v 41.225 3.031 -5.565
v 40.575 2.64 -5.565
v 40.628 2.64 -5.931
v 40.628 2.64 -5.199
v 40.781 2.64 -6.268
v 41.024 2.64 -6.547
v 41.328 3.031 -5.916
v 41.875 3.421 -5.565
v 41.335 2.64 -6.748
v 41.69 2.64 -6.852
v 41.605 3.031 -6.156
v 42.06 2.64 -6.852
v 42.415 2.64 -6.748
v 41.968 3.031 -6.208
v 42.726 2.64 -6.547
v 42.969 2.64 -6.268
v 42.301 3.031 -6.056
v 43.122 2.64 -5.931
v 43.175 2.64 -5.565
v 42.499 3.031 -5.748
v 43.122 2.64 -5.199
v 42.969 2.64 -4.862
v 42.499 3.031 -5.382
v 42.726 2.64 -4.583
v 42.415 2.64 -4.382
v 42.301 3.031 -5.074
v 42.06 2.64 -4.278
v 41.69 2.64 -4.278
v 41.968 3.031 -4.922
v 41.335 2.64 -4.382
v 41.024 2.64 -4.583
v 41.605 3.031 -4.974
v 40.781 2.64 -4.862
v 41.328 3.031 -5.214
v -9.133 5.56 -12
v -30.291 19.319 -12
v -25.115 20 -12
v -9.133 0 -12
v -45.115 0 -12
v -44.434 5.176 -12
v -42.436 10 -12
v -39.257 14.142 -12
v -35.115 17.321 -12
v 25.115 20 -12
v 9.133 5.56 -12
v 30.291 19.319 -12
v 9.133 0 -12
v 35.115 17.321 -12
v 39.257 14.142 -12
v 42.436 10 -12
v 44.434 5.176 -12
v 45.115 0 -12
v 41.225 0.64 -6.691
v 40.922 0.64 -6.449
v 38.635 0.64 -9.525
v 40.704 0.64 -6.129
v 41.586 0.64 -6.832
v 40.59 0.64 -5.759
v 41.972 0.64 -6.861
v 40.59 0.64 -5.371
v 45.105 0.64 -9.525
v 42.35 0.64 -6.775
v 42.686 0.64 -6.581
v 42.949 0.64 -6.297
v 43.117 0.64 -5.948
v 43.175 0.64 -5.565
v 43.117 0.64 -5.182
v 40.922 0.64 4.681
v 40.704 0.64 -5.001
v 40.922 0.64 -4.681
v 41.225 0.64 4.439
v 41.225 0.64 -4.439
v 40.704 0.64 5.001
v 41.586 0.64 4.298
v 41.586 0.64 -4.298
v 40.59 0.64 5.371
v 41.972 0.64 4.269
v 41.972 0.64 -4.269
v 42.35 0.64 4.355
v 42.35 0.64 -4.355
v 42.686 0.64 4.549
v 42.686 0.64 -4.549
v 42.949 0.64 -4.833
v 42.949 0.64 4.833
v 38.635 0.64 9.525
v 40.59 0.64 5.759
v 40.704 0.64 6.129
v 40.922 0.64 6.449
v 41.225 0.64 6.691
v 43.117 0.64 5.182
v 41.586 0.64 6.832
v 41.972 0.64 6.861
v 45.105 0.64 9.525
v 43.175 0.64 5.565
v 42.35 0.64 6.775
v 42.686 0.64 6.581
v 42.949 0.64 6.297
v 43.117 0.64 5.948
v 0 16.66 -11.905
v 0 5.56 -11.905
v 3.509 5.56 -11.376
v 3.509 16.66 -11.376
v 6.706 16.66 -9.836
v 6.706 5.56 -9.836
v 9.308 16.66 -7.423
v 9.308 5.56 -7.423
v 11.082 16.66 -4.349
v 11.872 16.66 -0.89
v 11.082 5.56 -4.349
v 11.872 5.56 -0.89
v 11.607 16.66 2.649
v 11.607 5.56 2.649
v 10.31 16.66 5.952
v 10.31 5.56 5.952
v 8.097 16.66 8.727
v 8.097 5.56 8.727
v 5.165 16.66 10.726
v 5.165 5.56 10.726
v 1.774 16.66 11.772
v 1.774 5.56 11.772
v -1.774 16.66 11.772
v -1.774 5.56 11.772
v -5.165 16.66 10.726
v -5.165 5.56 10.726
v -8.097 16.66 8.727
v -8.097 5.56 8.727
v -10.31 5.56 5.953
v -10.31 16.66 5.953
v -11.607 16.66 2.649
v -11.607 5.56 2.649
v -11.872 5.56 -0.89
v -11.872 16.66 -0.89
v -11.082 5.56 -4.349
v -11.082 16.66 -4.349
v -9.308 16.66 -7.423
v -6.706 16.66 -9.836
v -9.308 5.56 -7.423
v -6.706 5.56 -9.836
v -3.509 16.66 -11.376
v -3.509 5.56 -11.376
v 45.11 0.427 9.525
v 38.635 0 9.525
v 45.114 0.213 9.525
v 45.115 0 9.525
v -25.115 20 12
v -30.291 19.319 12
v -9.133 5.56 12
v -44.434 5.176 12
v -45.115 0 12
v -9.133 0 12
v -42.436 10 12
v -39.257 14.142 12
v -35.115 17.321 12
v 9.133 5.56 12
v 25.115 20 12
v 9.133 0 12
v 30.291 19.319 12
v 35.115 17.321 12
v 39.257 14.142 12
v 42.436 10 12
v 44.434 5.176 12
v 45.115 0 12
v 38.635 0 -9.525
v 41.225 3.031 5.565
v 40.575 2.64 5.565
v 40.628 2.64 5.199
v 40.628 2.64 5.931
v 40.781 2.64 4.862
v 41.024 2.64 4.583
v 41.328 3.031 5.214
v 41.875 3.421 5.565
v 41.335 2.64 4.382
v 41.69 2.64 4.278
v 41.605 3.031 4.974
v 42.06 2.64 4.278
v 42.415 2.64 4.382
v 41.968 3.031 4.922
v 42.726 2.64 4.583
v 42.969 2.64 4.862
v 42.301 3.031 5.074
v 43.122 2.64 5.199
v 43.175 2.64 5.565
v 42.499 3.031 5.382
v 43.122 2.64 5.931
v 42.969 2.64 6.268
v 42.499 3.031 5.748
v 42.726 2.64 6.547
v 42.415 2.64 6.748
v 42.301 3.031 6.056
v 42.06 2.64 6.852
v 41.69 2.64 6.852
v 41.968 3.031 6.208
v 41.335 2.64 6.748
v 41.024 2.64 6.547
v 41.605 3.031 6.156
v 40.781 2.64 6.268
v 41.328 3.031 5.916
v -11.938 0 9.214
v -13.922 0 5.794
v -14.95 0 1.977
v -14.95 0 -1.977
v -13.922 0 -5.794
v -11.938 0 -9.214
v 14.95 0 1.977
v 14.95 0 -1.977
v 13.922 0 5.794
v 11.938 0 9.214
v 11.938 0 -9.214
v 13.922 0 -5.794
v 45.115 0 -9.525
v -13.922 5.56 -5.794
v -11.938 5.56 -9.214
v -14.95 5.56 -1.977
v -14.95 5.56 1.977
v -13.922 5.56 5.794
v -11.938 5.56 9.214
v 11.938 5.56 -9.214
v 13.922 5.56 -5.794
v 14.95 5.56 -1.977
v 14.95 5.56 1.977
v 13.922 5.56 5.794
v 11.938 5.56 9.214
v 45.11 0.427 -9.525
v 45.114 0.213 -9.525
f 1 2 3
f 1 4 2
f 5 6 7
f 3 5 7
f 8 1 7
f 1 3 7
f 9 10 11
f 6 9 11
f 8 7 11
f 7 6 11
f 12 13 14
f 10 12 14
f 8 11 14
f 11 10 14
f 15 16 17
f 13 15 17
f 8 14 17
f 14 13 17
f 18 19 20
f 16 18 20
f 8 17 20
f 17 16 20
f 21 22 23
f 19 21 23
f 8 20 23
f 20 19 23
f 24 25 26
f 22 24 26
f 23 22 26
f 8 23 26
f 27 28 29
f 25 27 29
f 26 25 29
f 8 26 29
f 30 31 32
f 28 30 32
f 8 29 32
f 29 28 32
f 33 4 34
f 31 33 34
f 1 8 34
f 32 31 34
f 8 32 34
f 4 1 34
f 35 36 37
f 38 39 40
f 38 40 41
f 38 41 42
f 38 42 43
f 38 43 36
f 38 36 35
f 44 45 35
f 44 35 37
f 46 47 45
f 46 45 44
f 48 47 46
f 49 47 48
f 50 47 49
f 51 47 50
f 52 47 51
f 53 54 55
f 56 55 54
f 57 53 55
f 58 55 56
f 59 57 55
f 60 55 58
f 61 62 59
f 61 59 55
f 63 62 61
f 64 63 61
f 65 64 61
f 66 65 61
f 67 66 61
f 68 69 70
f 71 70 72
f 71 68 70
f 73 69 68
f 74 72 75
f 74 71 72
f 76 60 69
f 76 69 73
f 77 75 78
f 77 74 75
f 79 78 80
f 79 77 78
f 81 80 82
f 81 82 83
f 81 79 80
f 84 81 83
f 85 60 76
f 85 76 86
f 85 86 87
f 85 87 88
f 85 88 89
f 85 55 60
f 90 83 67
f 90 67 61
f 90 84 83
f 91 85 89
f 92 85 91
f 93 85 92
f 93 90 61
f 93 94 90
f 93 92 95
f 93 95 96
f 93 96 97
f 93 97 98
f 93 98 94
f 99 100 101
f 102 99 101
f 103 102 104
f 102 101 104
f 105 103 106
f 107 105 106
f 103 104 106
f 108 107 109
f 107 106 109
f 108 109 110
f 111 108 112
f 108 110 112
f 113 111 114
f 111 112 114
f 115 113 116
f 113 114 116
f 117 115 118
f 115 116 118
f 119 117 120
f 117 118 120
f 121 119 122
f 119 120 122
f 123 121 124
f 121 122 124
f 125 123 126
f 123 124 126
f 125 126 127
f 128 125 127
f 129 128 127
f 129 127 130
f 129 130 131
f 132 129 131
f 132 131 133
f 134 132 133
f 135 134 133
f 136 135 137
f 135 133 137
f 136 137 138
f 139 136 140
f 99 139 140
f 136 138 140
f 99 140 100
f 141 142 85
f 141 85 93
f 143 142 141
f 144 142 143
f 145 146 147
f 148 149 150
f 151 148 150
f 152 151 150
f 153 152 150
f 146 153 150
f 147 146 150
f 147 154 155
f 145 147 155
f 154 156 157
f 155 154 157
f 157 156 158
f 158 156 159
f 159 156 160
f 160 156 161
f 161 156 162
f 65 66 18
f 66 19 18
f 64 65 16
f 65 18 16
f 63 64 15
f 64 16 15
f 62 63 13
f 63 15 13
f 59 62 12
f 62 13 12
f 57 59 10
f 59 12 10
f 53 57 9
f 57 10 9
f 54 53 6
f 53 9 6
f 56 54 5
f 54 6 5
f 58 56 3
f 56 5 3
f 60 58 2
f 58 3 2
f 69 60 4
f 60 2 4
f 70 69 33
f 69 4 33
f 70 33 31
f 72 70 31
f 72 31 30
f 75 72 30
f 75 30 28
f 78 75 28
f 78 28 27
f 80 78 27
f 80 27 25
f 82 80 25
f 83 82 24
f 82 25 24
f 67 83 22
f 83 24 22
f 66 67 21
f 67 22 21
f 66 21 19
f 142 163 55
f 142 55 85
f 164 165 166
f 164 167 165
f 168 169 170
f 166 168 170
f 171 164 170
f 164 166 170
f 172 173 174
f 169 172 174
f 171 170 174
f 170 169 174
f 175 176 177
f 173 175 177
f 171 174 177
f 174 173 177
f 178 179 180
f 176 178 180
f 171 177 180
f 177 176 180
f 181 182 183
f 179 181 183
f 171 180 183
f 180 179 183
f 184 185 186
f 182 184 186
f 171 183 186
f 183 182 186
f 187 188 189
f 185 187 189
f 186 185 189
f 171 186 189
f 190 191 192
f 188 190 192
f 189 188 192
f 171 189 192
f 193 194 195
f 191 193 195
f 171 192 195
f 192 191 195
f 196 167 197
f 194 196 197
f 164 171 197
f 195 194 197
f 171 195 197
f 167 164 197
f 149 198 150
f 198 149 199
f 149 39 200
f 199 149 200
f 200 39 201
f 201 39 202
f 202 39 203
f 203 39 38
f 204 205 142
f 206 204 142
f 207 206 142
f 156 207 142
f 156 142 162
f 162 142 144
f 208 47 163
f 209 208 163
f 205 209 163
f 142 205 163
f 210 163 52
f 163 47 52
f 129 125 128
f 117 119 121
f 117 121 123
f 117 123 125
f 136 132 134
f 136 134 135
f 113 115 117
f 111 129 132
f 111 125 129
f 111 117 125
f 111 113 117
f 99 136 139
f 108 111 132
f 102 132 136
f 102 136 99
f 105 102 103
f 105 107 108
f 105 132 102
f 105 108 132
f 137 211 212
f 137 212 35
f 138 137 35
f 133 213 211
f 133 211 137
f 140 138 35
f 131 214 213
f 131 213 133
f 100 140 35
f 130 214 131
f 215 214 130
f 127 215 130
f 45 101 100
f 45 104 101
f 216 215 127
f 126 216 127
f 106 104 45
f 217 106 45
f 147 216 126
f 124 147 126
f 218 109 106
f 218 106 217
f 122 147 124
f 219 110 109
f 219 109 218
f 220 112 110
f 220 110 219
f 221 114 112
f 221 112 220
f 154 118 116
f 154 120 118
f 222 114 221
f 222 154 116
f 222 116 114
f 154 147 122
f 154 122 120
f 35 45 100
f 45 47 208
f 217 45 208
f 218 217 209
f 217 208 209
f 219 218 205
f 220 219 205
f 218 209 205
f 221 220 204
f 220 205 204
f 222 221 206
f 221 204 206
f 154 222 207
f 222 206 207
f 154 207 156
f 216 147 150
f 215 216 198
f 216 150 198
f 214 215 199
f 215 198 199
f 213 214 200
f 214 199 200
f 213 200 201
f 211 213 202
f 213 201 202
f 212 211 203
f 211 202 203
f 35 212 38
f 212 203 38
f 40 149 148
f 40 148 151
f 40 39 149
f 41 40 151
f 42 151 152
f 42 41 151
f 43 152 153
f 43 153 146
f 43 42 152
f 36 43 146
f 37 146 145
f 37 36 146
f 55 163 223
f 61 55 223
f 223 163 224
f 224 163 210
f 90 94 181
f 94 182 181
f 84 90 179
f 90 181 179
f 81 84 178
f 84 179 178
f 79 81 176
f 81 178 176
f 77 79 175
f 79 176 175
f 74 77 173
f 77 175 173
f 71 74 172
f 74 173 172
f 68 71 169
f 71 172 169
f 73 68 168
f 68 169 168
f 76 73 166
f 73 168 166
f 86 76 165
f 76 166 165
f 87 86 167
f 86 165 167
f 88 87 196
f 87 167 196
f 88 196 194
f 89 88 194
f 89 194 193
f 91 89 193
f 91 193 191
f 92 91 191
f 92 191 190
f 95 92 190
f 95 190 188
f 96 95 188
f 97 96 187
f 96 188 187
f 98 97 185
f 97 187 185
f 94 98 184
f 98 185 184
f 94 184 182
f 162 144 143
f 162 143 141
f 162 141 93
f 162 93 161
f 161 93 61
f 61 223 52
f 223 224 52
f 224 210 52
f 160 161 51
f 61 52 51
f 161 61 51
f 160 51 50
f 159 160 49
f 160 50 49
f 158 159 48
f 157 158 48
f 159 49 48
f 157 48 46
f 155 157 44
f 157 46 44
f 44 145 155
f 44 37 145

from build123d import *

# Parameters (mm, degrees)
SKETCH1_W                = 90.23
SKETCH1_H                = 24
BOSS_EXTRUDE1_DEPTH      = 20
FILLET1_R                = 20
SKETCH2_W                = 6.48
SKETCH2_H                = 19.05
CUT_EXTRUDE1_DEPTH       = 0.64
M2_CLEARANCE_HOLE1_D     = 2.6
M2_CLEARANCE_HOLE1_DEPTH = 2
M2_CLEARANCE_HOLE1_TIP   = 0.781118805
SKETCH5_R                = 15.08
CUT_EXTRUDE2_DEPTH       = 5.56
SKETCH6_R                = 11.905
CUT_EXTRUDE3_DEPTH       = 11.1


with BuildPart() as part:
    # Sketch1 → Boss-Extrude1 (new body)
    with BuildSketch(Plane(origin=(0, 0, 0), x_dir=(1, 0, 0), z_dir=(0, 1, 0))):
        Rectangle(SKETCH1_W, SKETCH1_H)
    extrude(amount=BOSS_EXTRUDE1_DEPTH)

    # Fillet1
    fillet1_edges = [part.edges().sort_by_distance(p)[0] for p in [
        (45.115, 20, 0),
        (-45.115, 20, 0),
    ]]
    fillet(fillet1_edges, radius=FILLET1_R - 0.0001)  # a hair under: the kernel refuses the full size

    # Sketch2 → Cut-Extrude1 (cut)
    with BuildSketch(Plane.XZ):
        with Locations((41.875, 0)):
            Rectangle(SKETCH2_W, SKETCH2_H)
    extrude(amount=-CUT_EXTRUDE1_DEPTH, mode=Mode.SUBTRACT)

    # M2 Clearance Hole1
    with Locations(Plane(origin=(0, 0.64, 0), x_dir=(-1, 0, 0), z_dir=(0, -1, 0))):
        with Locations((-41.875, 5.565), (-41.875, -5.565)):
            Hole(M2_CLEARANCE_HOLE1_D / 2, depth=M2_CLEARANCE_HOLE1_DEPTH)
            with Locations((0, 0, -(M2_CLEARANCE_HOLE1_DEPTH + M2_CLEARANCE_HOLE1_TIP / 2))):  # 118° drill point
                Cone(0, M2_CLEARANCE_HOLE1_D / 2, M2_CLEARANCE_HOLE1_TIP, mode=Mode.SUBTRACT)

    # Sketch5 → Cut-Extrude2 (cut)
    with BuildSketch(Plane.XZ):
        Circle(SKETCH5_R)
    extrude(amount=-CUT_EXTRUDE2_DEPTH, mode=Mode.SUBTRACT)

    # Sketch6 → Cut-Extrude3 (cut)
    with BuildSketch(Plane.XZ.offset(-5.56)):
        with Locations(Location((0, 0, 0), (0, 0, 270))):
            Circle(SKETCH6_R)
    extrude(amount=-CUT_EXTRUDE3_DEPTH, mode=Mode.SUBTRACT)


solid = part.part
